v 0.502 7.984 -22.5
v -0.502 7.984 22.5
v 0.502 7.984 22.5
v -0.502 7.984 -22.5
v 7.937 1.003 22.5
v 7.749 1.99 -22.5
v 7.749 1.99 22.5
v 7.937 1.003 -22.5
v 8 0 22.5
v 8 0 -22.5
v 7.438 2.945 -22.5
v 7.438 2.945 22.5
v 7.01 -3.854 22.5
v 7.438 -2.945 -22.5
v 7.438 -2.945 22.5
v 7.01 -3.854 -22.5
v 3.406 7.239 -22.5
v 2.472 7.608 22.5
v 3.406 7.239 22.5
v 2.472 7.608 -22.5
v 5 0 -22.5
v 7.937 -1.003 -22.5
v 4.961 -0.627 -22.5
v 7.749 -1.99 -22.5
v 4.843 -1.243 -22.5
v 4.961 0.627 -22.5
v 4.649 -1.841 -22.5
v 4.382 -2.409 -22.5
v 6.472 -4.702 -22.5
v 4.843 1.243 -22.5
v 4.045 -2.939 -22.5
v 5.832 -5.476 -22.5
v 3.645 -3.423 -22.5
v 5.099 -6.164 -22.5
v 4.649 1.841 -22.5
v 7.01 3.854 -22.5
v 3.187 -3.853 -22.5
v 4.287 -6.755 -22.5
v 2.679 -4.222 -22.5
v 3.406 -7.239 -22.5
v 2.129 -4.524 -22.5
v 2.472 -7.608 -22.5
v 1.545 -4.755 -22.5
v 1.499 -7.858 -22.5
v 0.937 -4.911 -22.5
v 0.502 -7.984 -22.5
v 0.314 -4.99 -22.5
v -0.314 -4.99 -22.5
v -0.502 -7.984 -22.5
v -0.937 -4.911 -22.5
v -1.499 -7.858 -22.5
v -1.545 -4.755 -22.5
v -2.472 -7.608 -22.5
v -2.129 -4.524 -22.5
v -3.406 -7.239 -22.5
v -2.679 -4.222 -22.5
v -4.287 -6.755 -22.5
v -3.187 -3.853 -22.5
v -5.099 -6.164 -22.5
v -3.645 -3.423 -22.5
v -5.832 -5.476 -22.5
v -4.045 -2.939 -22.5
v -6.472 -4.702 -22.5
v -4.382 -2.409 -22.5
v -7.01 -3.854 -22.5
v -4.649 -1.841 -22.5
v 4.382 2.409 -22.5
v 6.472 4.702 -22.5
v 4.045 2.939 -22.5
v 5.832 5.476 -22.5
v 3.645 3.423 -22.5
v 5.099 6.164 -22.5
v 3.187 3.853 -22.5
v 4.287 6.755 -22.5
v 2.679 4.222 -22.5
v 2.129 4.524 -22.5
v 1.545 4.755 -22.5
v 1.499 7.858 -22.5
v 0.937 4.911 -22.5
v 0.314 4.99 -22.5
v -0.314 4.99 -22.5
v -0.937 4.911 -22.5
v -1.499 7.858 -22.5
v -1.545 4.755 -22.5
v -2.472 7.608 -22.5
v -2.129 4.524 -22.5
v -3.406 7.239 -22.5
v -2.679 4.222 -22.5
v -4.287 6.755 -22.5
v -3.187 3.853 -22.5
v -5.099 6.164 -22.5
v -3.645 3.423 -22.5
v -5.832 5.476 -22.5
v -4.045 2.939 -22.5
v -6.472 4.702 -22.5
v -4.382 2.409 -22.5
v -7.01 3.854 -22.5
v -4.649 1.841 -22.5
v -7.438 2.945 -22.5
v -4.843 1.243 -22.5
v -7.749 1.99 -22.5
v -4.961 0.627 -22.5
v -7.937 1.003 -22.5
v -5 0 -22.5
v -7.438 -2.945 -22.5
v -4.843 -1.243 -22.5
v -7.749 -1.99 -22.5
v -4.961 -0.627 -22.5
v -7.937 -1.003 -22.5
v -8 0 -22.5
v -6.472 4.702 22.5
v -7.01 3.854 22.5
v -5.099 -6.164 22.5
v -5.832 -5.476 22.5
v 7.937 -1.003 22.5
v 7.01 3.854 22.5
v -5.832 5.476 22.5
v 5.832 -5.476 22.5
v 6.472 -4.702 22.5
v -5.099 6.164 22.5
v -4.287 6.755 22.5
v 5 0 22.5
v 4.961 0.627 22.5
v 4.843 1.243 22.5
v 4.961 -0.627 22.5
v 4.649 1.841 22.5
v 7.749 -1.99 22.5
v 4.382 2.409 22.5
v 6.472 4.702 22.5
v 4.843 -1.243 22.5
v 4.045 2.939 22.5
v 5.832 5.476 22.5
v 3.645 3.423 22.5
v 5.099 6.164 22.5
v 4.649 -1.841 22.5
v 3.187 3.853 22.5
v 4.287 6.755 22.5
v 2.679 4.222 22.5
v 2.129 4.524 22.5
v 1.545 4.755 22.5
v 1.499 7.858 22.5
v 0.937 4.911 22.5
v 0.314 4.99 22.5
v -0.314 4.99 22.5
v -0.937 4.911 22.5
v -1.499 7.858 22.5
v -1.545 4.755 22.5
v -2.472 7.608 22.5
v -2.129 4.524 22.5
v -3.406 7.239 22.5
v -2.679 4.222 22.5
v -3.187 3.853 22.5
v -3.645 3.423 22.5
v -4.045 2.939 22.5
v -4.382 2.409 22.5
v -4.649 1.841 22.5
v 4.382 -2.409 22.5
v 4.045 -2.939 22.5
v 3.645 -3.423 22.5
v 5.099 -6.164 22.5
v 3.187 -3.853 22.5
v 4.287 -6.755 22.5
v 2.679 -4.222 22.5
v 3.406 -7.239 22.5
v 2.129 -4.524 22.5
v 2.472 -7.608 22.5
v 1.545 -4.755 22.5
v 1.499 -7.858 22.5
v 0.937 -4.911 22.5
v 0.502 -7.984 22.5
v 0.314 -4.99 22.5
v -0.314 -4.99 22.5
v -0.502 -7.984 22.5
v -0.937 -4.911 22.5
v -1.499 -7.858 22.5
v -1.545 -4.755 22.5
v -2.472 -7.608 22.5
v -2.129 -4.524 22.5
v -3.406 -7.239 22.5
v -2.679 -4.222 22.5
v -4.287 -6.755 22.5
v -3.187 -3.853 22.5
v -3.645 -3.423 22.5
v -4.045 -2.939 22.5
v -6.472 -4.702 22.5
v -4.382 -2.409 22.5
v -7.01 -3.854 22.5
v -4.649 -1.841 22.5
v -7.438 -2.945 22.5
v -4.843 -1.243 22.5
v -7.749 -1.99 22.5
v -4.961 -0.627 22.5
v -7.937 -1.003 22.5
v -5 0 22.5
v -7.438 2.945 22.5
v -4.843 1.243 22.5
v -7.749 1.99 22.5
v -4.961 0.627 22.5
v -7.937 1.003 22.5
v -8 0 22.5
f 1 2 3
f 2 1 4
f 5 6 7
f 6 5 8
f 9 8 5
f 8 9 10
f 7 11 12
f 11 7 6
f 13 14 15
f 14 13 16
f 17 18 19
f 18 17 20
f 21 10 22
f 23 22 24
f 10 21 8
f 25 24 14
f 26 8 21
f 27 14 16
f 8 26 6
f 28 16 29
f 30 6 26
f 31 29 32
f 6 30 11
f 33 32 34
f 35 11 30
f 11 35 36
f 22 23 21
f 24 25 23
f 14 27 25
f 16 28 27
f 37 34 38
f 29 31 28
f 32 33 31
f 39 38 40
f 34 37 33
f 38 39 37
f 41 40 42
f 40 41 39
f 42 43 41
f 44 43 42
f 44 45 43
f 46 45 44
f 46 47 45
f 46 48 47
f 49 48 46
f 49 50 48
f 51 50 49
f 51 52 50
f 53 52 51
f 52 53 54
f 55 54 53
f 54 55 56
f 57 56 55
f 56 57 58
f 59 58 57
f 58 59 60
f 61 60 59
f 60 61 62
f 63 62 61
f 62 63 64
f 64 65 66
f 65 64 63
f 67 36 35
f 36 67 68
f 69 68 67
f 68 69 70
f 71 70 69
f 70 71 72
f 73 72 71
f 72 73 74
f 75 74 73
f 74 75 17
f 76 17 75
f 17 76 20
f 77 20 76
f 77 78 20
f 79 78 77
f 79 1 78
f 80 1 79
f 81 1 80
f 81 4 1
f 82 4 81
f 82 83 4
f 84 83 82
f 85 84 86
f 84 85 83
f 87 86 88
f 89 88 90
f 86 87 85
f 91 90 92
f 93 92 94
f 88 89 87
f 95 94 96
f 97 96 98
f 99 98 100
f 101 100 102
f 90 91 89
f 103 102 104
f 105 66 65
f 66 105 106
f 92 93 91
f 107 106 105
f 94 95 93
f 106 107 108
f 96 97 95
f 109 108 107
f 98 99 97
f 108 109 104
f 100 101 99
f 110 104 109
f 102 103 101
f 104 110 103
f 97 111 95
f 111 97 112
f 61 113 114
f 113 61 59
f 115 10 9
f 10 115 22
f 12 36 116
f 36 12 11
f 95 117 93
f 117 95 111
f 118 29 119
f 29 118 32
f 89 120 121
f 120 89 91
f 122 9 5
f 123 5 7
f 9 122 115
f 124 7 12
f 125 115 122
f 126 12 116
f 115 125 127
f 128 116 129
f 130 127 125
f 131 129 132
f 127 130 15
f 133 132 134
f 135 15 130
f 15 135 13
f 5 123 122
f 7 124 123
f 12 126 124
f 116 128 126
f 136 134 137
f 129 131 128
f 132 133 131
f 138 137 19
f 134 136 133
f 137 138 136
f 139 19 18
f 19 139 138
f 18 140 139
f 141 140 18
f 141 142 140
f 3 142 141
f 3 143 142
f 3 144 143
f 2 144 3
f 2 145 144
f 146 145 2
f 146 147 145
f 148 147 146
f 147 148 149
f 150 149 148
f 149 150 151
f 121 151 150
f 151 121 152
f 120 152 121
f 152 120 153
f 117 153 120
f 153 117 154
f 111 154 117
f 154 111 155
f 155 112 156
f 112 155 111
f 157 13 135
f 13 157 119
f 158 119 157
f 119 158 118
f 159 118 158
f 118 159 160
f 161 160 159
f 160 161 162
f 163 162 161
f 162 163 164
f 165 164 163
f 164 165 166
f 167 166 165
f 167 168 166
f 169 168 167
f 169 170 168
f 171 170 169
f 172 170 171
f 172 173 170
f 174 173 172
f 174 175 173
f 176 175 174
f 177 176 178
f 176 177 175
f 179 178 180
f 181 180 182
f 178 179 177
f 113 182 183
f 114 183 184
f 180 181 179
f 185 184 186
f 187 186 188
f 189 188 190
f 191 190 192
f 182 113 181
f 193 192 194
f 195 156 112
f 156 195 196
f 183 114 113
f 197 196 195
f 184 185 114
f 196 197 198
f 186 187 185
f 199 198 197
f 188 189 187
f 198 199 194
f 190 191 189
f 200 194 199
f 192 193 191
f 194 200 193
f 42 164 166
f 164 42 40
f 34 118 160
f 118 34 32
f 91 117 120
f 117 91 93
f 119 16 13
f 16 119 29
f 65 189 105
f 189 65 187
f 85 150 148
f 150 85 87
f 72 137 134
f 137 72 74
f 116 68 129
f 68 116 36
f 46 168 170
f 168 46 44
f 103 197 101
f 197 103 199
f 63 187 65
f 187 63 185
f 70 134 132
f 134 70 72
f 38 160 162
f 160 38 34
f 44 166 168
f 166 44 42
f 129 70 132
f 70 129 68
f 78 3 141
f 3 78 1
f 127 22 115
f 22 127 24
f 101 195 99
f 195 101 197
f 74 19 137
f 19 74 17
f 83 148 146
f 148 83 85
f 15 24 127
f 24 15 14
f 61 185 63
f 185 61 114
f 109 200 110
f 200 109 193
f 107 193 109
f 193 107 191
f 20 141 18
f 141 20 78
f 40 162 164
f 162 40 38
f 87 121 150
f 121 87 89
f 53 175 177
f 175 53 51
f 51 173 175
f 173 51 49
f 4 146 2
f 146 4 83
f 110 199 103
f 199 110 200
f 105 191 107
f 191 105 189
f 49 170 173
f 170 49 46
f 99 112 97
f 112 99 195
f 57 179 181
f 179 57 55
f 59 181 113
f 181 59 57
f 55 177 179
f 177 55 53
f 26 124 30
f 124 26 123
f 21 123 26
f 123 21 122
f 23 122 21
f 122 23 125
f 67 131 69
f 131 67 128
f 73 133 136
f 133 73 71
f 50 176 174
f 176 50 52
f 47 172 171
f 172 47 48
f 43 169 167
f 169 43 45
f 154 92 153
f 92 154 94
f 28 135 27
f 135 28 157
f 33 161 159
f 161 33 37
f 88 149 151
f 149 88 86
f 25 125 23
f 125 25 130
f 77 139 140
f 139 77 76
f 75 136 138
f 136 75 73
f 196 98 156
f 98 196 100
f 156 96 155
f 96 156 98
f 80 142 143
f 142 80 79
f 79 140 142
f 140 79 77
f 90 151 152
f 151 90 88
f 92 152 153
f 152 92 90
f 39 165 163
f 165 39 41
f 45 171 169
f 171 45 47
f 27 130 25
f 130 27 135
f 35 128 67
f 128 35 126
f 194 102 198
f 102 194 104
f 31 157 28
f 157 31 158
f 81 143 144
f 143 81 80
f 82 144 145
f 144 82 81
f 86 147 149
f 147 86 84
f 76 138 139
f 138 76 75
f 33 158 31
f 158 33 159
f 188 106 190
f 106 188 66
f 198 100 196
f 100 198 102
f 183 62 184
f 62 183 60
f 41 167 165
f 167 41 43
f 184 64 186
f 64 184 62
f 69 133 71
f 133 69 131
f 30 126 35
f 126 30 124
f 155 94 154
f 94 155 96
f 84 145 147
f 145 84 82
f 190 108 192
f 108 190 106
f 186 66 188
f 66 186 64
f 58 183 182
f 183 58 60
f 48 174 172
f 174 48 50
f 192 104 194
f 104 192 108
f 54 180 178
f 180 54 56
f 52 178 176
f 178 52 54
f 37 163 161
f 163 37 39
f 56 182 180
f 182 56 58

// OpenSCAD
$fn = 50;


difference() {
	union() {
		translate(v = [0, 0, -22.5000000000]) {
			cylinder(h = 45, r = 8.0000000000);
		}
	}
	union() {
		translate(v = [0, 0, -100.0000000000]) {
			cylinder(h = 200, r = 5.0000000000);
		}
	}
}
